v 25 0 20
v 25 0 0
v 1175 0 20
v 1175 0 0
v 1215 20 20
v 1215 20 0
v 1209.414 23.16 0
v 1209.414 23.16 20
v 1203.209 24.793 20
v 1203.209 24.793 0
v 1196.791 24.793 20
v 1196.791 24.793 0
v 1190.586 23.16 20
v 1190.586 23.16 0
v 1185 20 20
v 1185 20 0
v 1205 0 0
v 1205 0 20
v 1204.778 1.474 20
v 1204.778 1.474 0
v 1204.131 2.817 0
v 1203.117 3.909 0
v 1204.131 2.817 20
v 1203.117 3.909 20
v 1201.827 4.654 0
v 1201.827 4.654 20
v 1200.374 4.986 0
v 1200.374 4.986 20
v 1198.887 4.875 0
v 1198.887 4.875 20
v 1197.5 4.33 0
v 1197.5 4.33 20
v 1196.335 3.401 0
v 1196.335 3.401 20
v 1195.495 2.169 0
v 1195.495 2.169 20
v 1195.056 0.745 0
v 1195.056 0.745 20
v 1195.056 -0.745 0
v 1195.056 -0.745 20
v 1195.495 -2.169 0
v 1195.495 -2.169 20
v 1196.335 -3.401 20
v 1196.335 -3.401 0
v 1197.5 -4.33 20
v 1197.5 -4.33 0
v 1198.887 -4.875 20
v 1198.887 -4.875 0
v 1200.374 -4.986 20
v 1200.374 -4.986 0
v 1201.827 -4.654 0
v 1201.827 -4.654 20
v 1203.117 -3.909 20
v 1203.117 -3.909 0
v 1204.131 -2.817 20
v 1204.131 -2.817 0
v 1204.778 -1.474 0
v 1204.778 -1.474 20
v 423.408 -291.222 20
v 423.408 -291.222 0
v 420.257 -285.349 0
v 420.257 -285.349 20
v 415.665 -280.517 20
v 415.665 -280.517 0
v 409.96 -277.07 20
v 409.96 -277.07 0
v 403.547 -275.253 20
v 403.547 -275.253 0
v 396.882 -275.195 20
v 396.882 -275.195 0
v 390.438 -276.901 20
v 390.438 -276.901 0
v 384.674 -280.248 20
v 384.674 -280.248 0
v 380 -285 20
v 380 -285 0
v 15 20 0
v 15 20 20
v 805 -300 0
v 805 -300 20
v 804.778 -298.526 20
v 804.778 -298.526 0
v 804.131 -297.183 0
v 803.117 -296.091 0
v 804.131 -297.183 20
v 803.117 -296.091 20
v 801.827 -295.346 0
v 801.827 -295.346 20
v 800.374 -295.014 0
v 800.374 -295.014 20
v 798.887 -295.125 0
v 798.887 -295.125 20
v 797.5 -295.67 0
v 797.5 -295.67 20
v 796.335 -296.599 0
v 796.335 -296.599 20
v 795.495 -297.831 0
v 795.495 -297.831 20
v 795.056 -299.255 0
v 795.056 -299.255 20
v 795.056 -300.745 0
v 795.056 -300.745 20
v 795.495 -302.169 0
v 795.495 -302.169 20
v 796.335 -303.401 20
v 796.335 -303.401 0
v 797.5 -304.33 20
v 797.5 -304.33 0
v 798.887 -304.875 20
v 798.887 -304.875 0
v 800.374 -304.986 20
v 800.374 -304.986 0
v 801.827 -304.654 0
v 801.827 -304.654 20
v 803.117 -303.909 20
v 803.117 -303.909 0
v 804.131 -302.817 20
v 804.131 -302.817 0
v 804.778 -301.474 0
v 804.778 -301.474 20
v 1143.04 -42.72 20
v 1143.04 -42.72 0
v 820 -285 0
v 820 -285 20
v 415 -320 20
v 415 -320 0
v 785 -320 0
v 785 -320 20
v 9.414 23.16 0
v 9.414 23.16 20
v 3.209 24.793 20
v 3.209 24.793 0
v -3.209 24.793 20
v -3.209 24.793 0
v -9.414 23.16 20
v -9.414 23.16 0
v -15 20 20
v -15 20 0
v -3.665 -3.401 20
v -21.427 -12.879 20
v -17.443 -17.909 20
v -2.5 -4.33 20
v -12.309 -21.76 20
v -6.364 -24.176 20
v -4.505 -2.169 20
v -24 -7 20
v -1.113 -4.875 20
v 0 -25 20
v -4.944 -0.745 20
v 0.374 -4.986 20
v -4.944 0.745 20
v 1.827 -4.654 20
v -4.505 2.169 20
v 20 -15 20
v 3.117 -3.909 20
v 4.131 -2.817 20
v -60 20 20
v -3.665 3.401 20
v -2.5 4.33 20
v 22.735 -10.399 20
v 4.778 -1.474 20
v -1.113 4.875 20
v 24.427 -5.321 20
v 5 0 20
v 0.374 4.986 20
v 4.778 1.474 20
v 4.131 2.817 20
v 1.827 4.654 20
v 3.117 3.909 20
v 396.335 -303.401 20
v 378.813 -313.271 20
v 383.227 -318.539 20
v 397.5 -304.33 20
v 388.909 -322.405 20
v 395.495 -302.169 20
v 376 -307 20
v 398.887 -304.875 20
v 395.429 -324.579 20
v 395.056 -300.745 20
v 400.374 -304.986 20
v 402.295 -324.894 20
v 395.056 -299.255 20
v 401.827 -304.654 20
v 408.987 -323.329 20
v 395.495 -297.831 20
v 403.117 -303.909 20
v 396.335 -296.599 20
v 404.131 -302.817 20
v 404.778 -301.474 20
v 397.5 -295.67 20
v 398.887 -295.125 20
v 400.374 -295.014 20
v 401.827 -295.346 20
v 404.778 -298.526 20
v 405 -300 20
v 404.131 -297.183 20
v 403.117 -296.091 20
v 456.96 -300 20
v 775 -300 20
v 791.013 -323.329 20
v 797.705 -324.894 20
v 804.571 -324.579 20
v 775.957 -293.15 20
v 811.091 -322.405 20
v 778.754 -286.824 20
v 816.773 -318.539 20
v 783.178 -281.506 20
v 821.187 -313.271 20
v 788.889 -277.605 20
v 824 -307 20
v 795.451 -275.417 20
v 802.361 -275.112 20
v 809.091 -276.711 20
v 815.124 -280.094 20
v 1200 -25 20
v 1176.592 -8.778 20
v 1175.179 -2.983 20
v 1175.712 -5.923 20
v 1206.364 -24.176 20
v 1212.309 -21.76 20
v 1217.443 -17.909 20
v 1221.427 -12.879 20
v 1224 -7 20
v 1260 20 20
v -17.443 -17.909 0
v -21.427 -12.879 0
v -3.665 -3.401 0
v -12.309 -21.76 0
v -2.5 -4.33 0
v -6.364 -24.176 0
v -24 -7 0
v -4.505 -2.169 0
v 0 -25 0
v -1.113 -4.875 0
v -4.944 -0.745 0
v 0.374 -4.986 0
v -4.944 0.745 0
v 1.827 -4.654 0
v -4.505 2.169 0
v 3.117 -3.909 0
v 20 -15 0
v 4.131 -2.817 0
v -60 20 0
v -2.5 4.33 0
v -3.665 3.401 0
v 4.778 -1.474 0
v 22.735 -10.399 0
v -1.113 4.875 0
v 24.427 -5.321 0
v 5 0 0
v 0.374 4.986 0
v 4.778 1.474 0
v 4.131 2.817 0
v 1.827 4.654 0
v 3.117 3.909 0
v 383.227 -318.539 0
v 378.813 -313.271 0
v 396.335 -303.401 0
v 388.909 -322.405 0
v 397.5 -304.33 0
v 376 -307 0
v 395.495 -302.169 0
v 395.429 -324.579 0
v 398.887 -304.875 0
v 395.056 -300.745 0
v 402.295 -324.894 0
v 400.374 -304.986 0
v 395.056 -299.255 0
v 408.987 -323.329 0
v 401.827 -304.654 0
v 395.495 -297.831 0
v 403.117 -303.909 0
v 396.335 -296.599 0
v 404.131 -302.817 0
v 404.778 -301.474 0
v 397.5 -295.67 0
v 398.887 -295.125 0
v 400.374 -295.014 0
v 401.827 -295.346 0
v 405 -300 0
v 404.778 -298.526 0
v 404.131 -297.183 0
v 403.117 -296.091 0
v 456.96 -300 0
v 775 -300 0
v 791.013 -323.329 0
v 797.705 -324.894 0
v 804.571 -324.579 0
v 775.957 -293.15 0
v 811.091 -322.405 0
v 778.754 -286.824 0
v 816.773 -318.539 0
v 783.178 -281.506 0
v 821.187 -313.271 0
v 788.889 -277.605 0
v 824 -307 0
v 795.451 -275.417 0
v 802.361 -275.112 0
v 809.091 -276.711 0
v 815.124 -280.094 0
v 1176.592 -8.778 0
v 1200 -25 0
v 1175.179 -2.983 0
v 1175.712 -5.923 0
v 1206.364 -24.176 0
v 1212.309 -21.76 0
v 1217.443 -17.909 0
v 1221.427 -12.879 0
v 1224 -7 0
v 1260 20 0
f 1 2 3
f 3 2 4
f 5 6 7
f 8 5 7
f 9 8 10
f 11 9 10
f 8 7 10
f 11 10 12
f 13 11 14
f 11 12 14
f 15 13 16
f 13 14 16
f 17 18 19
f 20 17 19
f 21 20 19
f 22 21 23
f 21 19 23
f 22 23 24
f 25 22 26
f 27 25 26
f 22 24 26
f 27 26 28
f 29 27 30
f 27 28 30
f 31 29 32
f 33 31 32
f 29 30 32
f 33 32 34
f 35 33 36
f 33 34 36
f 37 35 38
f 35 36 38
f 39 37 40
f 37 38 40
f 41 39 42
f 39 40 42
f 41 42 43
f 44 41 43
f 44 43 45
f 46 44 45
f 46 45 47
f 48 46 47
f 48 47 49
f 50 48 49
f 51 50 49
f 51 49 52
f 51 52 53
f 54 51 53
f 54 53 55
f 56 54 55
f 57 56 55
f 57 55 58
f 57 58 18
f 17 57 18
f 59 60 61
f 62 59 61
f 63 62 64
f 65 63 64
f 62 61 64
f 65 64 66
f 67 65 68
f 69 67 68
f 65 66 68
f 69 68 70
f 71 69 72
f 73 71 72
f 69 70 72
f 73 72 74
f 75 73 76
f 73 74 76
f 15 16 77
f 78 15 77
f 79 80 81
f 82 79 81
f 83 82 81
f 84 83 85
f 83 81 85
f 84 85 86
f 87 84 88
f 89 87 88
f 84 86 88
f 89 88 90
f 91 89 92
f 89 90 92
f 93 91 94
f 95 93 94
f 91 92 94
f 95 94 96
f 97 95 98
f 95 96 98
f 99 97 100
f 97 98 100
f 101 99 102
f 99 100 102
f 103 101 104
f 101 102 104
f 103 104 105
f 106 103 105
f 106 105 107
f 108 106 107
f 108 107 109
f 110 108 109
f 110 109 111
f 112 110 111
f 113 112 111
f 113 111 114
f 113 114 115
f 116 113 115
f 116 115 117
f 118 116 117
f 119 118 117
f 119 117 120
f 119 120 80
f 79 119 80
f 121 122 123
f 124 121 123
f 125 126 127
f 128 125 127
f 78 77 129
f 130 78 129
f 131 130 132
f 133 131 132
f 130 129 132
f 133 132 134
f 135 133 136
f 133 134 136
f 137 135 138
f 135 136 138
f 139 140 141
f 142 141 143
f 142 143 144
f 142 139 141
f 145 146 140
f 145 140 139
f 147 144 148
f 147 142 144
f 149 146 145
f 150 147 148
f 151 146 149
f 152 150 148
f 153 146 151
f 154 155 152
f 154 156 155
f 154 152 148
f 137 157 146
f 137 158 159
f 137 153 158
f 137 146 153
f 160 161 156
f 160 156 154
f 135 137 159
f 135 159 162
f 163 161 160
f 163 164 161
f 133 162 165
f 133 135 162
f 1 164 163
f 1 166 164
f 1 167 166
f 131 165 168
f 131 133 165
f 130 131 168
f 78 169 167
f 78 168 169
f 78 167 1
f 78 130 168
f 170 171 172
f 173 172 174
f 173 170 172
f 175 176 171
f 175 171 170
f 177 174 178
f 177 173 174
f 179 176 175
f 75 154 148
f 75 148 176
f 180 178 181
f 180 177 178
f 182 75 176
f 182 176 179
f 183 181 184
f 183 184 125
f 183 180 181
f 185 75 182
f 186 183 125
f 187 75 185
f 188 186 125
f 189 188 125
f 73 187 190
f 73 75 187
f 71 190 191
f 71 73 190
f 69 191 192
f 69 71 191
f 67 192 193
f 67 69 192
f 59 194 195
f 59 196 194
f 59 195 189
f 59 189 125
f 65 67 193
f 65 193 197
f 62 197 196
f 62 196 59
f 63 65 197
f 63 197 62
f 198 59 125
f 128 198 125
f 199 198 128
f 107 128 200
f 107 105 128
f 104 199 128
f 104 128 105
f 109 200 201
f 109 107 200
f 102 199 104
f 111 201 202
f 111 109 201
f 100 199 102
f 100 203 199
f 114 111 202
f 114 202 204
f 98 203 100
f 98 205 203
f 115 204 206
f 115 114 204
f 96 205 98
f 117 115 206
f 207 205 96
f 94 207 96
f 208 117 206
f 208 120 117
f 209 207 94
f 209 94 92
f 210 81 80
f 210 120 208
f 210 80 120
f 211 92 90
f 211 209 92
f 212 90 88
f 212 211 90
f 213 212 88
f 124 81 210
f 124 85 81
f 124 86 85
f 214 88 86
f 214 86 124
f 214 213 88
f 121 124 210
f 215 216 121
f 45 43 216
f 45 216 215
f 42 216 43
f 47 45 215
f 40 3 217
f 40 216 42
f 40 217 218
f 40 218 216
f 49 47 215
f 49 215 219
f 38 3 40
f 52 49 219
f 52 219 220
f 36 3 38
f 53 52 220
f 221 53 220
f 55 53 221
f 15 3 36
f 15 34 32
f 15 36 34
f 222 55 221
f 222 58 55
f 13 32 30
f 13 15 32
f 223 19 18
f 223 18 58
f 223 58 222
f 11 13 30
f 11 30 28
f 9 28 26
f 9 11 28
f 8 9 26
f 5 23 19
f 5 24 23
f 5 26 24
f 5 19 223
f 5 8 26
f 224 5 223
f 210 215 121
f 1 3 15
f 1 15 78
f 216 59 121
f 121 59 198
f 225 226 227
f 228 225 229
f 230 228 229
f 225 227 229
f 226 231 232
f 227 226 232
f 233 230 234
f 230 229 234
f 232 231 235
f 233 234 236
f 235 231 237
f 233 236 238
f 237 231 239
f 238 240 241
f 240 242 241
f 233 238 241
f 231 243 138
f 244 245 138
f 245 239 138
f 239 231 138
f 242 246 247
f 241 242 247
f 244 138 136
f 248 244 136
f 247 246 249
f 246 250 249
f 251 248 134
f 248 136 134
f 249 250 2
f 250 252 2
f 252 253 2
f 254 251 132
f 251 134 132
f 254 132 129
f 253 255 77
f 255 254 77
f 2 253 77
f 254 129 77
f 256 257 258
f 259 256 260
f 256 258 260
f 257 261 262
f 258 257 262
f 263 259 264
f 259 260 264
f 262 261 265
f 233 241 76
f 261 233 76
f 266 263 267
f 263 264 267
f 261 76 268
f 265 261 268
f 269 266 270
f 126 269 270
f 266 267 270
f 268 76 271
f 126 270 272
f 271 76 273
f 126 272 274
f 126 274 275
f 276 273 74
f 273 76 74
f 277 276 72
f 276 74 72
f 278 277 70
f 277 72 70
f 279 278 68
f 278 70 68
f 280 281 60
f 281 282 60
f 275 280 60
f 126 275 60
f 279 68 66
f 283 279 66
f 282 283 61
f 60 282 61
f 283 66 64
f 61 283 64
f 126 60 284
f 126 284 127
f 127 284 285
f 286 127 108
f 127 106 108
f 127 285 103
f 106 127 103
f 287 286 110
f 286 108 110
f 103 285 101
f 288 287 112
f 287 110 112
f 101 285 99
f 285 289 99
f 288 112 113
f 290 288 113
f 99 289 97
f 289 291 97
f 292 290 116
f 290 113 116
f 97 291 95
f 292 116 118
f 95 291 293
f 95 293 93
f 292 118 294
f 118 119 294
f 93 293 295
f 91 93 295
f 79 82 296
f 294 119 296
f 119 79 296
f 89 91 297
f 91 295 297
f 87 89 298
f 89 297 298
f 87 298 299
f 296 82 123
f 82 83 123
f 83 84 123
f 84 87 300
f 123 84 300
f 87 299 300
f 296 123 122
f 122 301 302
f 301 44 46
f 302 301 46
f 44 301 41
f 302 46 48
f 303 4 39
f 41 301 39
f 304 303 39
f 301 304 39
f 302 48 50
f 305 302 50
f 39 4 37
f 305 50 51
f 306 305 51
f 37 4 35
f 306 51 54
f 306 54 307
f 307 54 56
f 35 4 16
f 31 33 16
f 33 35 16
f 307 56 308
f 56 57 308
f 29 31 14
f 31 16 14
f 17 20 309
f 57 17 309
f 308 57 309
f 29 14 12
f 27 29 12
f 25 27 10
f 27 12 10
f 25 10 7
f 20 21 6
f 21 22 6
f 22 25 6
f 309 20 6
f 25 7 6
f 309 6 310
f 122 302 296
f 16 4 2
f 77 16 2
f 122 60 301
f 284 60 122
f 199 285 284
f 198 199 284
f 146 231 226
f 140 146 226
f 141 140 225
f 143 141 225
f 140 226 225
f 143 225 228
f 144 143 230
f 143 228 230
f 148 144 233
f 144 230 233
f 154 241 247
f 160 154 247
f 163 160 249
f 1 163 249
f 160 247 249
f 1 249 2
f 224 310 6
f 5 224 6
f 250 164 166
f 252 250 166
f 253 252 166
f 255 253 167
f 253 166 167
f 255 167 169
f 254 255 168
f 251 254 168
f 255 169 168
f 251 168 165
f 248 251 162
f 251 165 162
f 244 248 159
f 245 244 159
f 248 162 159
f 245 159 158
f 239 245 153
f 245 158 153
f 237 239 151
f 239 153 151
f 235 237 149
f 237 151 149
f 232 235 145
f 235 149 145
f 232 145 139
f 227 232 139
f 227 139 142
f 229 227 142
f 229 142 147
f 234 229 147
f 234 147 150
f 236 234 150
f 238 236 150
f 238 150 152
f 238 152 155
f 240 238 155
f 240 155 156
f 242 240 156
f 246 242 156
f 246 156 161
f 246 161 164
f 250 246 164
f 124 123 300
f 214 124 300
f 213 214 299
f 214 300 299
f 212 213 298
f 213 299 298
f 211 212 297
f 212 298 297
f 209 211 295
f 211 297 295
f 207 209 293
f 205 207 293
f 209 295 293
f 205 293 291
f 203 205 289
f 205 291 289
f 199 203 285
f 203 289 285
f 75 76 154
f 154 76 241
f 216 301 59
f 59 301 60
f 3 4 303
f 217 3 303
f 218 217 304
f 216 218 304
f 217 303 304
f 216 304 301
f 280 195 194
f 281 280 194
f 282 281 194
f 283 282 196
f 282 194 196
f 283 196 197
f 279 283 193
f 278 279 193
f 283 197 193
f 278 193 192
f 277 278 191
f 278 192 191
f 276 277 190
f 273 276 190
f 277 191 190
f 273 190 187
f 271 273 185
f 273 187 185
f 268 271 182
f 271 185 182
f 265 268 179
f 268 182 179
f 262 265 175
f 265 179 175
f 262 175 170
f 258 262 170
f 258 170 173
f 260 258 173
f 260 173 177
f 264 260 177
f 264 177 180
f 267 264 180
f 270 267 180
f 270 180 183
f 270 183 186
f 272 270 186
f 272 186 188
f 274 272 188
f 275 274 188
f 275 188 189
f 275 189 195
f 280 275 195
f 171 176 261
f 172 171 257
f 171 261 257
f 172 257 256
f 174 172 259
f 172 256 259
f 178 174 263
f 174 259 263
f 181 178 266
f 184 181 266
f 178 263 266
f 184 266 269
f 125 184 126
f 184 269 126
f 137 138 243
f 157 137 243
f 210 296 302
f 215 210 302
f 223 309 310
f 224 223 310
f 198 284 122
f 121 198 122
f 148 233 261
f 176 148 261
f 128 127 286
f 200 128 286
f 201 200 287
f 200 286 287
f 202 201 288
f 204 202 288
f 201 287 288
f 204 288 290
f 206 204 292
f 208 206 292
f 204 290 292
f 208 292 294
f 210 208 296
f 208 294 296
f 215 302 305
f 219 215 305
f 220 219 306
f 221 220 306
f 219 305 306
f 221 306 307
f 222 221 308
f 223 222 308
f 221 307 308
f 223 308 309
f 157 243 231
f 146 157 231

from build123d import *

# Parameters (mm, degrees)
EXTRUDE_THIN2_DEPTH = 20
SKETCH4_R           = 5
CUT_EXTRUDE1_DEPTH  = 1302.393483924


# Read off the part's stored shape, not the designer's step: Extrude-Thin2
with BuildPart() as part:
    # Extrude-Thin2 outline → Extrude-Thin2 (new body)
    with BuildSketch(Plane.XY):
        with BuildLine():
            Line((-15, 20), (-60, 20))
            Line((-60, 20), (-24, -7))
            ThreePointArc((-24, -7), (-15, -20), (0, -25))
            Line((0, -25), (376, -307))
            ThreePointArc((376, -307), (392.09430585, -323.717082451), (415, -320))
            Line((415, -320), (785, -320))
            ThreePointArc((785, -320), (807.90569415, -323.717082451), (824, -307))
            Line((824, -307), (1200, -25))
            ThreePointArc((1200, -25), (1215, -20), (1224, -7))
            Line((1224, -7), (1260, 20))
            Line((1260, 20), (1215, 20))
            ThreePointArc((1215, 20), (1200, 25), (1185, 20))
            Line((1185, 20), (15, 20))
            ThreePointArc((15, 20), (0, 25), (-15, 20))
        make_face()
        with BuildLine():
            Line((456.960024969, -300), (1143.039975031, -42.720018727))
            Line((1143.039975031, -42.720018727), (820, -285))
            ThreePointArc((820, -285), (792.09430585, -276.282917549), (775, -300))
            Line((775, -300), (456.960024969, -300))
        make_face(mode=Mode.SUBTRACT)
        with BuildLine():
            ThreePointArc((1175, 0), (1175.401161247, -4.460620138), (1176.591770561, -8.77808604))
            Line((1176.591770561, -8.77808604), (423.408229439, -291.22191396))
            ThreePointArc((423.408229439, -291.22191396), (403.547120002, -275.252920583), (380, -285))
            Line((380, -285), (20, -15))
            ThreePointArc((20, -15), (23.717082451, -7.90569415), (25, 0))
            Line((25, 0), (1175, 0))
        make_face(mode=Mode.SUBTRACT)
    extrude(amount=EXTRUDE_THIN2_DEPTH)

    # Sketch4 → Cut-Extrude1 (cut, through all)
    with BuildSketch(Plane.XY.offset(20)):
        Circle(SKETCH4_R)
        with Locations((400, -300)):
            Circle(SKETCH4_R)
        with Locations((800, -300)):
            Circle(SKETCH4_R)
        with Locations((1200, 0)):
            Circle(SKETCH4_R)
    extrude(amount=-CUT_EXTRUDE1_DEPTH, mode=Mode.SUBTRACT)


solid = part.part
